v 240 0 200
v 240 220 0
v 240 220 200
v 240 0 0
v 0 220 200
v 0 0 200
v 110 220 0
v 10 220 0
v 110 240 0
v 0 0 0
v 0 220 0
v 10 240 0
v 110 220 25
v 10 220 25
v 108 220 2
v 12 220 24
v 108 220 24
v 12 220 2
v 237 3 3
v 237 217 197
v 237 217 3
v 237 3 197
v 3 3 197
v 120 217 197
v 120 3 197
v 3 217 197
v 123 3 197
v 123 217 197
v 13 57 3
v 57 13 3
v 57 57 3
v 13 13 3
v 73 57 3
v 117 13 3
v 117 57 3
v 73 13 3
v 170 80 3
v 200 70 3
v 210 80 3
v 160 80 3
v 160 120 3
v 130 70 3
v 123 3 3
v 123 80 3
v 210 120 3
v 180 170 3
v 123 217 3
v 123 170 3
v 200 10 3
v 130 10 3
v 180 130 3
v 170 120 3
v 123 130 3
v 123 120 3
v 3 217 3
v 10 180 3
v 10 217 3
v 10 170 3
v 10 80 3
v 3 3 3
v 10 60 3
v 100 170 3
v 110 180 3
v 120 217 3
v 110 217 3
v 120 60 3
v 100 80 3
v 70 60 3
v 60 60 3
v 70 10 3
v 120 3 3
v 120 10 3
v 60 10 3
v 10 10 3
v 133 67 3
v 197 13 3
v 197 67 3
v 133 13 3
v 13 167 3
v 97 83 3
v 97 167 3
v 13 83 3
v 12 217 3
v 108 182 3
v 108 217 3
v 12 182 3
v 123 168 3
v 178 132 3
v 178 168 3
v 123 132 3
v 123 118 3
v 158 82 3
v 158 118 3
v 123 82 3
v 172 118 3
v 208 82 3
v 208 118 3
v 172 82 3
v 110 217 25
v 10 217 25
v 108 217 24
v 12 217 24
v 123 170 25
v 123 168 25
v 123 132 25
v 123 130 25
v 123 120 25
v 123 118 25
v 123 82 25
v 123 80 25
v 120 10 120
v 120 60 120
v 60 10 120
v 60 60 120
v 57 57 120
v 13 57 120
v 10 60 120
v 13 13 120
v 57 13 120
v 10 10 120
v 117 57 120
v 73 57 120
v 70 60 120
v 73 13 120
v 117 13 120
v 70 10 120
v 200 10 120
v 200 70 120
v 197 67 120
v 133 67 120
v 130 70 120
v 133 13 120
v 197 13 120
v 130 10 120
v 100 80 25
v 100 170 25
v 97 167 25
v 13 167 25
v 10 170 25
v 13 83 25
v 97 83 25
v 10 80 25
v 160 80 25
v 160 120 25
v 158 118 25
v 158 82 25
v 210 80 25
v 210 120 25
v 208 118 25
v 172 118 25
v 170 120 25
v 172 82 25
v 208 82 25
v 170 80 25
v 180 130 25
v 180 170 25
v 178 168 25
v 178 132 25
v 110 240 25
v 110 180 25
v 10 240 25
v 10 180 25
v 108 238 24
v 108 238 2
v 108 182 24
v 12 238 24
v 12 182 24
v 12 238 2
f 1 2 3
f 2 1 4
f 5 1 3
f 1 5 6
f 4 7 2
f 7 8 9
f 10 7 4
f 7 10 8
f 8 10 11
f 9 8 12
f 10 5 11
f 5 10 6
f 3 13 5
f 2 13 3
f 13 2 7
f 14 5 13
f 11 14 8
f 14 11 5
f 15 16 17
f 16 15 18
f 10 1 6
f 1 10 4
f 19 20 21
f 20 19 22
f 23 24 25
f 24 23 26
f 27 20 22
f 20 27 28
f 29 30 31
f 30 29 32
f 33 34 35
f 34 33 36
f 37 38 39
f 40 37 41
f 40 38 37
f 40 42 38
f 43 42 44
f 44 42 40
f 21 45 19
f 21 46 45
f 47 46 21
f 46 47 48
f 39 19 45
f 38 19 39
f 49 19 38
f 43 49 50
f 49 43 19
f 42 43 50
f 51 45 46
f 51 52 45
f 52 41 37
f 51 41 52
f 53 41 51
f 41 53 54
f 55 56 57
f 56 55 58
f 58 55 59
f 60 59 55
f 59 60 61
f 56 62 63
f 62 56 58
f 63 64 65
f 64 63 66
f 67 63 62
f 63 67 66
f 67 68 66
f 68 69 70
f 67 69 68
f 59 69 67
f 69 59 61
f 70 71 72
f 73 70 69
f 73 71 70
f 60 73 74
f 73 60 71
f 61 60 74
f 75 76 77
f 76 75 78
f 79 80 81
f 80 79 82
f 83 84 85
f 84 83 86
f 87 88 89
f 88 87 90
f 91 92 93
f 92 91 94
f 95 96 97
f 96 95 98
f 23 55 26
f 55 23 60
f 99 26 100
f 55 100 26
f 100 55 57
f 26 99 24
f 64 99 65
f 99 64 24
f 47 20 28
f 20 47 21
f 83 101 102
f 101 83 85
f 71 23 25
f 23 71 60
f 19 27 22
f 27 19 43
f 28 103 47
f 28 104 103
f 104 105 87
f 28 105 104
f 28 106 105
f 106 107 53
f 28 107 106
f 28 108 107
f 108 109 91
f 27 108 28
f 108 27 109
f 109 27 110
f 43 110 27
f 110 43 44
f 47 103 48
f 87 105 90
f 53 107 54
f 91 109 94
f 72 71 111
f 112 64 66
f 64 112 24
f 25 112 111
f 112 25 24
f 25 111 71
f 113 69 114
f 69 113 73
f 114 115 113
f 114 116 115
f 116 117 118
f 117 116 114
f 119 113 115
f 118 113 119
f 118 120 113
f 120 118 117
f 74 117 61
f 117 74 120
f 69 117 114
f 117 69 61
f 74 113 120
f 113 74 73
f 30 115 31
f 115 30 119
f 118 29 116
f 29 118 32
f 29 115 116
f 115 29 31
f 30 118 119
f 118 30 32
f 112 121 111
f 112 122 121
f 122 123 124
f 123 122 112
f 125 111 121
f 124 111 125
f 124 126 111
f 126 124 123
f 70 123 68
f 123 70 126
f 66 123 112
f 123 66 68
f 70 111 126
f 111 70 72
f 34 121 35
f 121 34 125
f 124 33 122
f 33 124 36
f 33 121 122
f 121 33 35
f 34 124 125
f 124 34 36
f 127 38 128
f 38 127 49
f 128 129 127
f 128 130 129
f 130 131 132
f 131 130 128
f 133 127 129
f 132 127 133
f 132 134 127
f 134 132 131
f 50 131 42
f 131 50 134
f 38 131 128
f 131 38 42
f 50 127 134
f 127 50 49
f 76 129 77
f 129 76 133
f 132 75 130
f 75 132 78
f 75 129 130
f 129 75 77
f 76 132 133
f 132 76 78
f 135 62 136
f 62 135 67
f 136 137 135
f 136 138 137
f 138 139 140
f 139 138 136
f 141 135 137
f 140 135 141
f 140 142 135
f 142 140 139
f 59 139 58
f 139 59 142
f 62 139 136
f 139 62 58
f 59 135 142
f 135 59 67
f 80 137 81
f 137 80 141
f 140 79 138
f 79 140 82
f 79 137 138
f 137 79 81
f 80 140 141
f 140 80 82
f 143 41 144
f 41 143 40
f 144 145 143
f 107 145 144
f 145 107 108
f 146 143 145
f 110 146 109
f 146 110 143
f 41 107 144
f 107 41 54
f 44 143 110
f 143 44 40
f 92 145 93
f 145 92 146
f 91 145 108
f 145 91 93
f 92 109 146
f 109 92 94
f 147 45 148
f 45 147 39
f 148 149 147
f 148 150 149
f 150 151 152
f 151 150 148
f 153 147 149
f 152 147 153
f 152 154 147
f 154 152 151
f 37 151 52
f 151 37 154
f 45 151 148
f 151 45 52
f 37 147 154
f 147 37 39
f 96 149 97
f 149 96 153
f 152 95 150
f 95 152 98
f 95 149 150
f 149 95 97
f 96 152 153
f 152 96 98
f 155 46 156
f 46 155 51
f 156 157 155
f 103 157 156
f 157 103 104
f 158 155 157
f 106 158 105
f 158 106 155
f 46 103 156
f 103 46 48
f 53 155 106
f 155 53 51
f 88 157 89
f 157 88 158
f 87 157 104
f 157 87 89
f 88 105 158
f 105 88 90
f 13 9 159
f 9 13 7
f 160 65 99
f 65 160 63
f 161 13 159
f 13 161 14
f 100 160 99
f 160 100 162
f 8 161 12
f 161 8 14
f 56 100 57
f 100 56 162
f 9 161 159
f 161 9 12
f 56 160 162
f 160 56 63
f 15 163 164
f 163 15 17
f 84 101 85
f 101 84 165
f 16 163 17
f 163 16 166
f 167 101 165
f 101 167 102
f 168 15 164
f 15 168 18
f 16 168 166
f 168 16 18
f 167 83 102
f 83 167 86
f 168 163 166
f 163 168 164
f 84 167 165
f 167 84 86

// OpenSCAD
// file: card_holder.scad
module card_holder()
{
    difference()
    {
        cube([100,60,25]);

        translate([2,2,2])
        cube([96,56,22]);
    }
}
// file: trays.scad
module small_tray()
{
    difference()
    {
        cube([40,40,25]);

        translate([2,2,2])
        cube([36,36,23]);
    }
}

module medium_tray()
{
    difference()
    {
        cube([60,40,25]);

        translate([2,2,2])
        cube([56,36,23]);
    }
}
// file: sticky_notes.scad
module sticky_notes_tray()
{
    difference()
    {
        cube([90,90,25]);

        translate([3,3,3])
        cube([84,84,22]);
    }
}
// file: scissor_holder.scad
module scissor_holder()
{
    difference()
    {
        cube([70,60,120]);

        translate([3,3,3])
        cube([64,54,117]);
    }
}
// file: marker_holder.scad
module marker_holder()
{
    difference()
    {
        cube([50,50,120]);

        translate([3,3,3])
        cube([44,44,117]);
    }
}
// file: pencil_holder.scad
module pencil_holder()
{
    difference()
    {
        cube([50,50,120]);

        translate([3,3,3])
        cube([44,44,117]);
    }
}
// file: base.scad
// Executive Desk Organizer Base

module organizer_base()
{
    difference()
    {
        // Main body
        cube([240,220,200]);

        // Hollow space
        translate([3,3,3])
        cube([234,214,194]);
    }

    // Center divider
    translate([120,0,0])
    cube([3,220,200]);
}
// main file
include <base.scad>
include <pencil_holder.scad>
include <marker_holder.scad>
include <scissor_holder.scad>
include <sticky_notes.scad>
include <trays.scad>
include <card_holder.scad>

organizer_base();

// Upper row
translate([10,10,0])
pencil_holder();

translate([70,10,0])
marker_holder();

translate([130,10,0])
scissor_holder();

// Sticky notes
translate([10,80,0])
sticky_notes_tray();

// Small trays
translate([120,80,0])
small_tray();

translate([170,80,0])
small_tray();

// Medium tray
translate([120,130,0])
medium_tray();

// Business cards
translate([10,180,0])
card_holder();
